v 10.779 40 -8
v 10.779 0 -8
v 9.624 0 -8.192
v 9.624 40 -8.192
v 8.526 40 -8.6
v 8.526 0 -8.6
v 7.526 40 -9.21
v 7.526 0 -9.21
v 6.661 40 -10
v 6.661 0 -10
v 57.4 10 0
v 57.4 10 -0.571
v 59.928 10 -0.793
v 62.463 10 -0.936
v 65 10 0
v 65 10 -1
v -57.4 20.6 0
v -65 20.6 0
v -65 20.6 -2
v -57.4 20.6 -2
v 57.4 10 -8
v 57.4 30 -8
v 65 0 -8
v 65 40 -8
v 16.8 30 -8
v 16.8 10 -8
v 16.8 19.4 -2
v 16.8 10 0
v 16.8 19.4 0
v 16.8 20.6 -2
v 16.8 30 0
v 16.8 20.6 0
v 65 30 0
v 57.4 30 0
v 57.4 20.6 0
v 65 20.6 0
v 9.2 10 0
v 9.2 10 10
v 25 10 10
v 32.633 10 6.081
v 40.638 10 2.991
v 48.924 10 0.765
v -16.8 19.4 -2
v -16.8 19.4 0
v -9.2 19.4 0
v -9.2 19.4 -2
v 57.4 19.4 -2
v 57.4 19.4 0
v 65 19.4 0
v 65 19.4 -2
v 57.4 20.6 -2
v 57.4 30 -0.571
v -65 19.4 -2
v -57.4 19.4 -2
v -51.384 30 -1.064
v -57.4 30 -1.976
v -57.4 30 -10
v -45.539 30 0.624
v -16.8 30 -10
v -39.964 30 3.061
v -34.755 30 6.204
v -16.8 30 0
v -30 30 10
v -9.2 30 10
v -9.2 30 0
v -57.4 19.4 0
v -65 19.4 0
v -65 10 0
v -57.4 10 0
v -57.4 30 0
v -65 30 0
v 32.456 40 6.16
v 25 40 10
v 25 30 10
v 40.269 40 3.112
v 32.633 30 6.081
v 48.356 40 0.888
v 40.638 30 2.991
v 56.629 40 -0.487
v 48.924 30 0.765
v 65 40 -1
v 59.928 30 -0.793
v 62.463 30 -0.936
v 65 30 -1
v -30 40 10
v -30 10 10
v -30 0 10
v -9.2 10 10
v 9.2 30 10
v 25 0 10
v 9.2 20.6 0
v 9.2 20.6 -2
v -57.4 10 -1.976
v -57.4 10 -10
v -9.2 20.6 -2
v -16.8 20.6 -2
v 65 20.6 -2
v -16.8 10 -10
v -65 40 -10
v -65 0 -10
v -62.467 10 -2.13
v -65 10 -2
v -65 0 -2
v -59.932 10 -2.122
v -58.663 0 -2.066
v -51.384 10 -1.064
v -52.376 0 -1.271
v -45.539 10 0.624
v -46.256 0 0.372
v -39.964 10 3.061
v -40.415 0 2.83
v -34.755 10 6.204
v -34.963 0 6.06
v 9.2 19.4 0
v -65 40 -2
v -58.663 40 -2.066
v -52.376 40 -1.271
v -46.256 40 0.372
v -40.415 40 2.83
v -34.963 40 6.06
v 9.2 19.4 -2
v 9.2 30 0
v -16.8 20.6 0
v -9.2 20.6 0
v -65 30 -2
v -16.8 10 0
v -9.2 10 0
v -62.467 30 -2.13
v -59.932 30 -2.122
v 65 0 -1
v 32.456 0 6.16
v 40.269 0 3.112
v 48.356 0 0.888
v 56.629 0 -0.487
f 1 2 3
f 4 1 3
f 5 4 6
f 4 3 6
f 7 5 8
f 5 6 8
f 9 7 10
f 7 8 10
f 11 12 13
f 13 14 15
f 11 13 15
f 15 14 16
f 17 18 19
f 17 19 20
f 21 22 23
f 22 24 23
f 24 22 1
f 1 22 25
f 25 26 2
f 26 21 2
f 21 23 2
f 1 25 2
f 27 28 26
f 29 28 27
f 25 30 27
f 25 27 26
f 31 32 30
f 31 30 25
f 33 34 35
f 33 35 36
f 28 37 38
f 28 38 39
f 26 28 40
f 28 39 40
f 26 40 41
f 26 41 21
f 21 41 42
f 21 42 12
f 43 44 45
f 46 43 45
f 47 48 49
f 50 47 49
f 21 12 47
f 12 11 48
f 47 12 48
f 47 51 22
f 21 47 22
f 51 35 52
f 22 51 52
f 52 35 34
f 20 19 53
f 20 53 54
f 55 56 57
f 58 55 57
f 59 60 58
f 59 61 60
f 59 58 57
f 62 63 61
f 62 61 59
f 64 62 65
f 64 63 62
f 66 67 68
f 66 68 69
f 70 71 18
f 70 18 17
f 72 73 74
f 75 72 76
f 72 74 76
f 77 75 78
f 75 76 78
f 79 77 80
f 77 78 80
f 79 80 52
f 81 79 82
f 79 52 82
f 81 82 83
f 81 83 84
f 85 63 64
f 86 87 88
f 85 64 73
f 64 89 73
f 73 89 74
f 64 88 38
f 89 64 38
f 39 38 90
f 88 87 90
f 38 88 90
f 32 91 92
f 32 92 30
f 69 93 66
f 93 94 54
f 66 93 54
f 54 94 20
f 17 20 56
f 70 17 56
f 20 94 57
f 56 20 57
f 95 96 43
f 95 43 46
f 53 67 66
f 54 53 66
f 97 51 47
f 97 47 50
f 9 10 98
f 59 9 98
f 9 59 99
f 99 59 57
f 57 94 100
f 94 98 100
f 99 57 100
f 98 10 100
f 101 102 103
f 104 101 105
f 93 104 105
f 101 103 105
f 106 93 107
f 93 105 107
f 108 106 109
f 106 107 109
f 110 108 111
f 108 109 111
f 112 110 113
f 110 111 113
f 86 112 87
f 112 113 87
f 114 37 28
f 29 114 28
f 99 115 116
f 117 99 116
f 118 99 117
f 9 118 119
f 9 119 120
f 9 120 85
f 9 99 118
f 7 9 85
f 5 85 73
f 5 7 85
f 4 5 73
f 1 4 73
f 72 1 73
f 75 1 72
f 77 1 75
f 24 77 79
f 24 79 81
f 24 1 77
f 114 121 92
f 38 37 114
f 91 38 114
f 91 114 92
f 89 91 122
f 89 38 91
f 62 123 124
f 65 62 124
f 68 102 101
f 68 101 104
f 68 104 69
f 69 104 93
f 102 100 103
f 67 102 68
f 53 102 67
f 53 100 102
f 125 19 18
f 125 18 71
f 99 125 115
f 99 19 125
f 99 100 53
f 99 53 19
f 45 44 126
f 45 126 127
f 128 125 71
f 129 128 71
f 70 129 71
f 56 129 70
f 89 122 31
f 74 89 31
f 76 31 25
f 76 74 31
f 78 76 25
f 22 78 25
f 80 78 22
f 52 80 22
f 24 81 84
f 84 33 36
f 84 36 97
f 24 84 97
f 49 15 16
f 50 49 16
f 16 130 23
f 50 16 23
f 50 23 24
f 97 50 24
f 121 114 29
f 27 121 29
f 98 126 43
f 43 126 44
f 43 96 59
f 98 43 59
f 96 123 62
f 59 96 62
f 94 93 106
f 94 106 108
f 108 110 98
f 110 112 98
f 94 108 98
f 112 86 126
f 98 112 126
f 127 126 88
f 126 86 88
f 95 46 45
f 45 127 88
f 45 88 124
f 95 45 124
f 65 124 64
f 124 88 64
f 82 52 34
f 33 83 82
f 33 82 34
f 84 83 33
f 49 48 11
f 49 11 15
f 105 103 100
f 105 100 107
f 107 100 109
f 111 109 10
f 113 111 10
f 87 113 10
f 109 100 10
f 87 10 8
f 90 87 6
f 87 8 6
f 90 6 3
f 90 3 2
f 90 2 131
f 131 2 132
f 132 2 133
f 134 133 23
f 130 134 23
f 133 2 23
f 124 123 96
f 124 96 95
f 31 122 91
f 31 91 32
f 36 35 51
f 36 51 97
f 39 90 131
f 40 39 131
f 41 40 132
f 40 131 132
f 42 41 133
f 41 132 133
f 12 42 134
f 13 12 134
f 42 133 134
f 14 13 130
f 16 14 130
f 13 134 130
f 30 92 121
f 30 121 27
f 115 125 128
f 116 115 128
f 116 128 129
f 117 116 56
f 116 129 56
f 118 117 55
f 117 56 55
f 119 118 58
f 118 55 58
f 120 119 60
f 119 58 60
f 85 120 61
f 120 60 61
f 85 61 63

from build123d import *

# Parameters (mm, degrees)
BOSS_EXTRUDE1_DEPTH = 40
SKETCH2_W           = 55.8
SKETCH2_H           = 20
CUT_EXTRUDE1_DEPTH  = 13.5
CUT_EXTRUDE2_REACH  = 79.506
SKETCH3_W           = 40.6
SKETCH3_H           = 20
SKETCH4_W           = 7.6
SKETCH4_H           = 20
BOSS_EXTRUDE2_DEPTH = 3.5
SKETCH5_W           = 55.8
SKETCH5_H           = 1.2
CUT_EXTRUDE3_DEPTH  = 2
SKETCH6_W           = 55.8
SKETCH6_H           = 1.2
CUT_EXTRUDE4_DEPTH  = 2


with BuildPart() as part:
    # Sketch1 → Boss-Extrude1 (new body)
    with BuildSketch(Plane(origin=(0, 0, 0), x_dir=(1, 0, 0), z_dir=(0, 1, 0))):
        with BuildLine():
            Line((65, 8), (23.977973373, 8))
            Line((23.977973373, 8), (10.779053292, 8))
            ThreePointArc((10.779053292, 8), (8.525859954, 8.600007042), (6.661212966, 10))
            Line((6.661212966, 10), (-20, 10))
            Line((-20, 10), (-65, 10))
            Line((-65, 10), (-65, 2))
            ThreePointArc((-65, 2), (-46.256011847, -0.371701222), (-30, -10))
            Line((-30, -10), (-20, -10))
            Line((-20, -10), (17.838709677, -10))
            Line((17.838709677, -10), (20, -10))
            Line((20, -10), (25, -10))
            ThreePointArc((25, -10), (44.283723708, -1.895358938), (65, 1))
            Line((65, 1), (65, 8))
        make_face()
    extrude(amount=BOSS_EXTRUDE1_DEPTH)

    # Sketch2 → Cut-Extrude1 (cut)
    with BuildSketch(Plane.XY.offset(10)):
        with Locations((37.1, 20)):
            Rectangle(SKETCH2_W, SKETCH2_H)
        with Locations((-37.1, 20)):
            Rectangle(SKETCH2_W, SKETCH2_H)
    extrude(amount=-CUT_EXTRUDE1_DEPTH, mode=Mode.SUBTRACT)

    # Sketch3 → Cut-Extrude2 (cut, up to next)
    with BuildSketch(Plane.XY.offset(-3.5), mode=Mode.PRIVATE) as cut_extrude2_sk1:
        with Locations((-37.1, 20)):
            Rectangle(SKETCH3_W, SKETCH3_H)
    cut_extrude2_tool1 = extrude(cut_extrude2_sk1.sketch, amount=-CUT_EXTRUDE2_REACH, mode=Mode.PRIVATE) & part.part
    # Sketch3 → Cut-Extrude2 (cut, up to next)
    with BuildSketch(Plane.XY.offset(-3.5), mode=Mode.PRIVATE) as cut_extrude2_sk2:
        with Locations((37.1, 20)):
            Rectangle(SKETCH3_W, SKETCH3_H)
    cut_extrude2_tool2 = extrude(cut_extrude2_sk2.sketch, amount=-CUT_EXTRUDE2_REACH, mode=Mode.PRIVATE) & part.part
    add(cut_extrude2_tool1.solids().sort_by_distance((-37.1, 20, -3.5))[0], mode=Mode.SUBTRACT)
    add(cut_extrude2_tool2.solids().sort_by_distance((37.1, 20, -3.5))[0], mode=Mode.SUBTRACT)

    # Sketch4 → Boss-Extrude2 (add)
    with BuildSketch(Plane.XY.offset(-3.5)):
        with Locations((-61.2, 20)):
            Rectangle(SKETCH4_W, SKETCH4_H)
        with Locations((-13, 20)):
            Rectangle(SKETCH4_W, SKETCH4_H)
        with Locations((13, 20)):
            Rectangle(SKETCH4_W, SKETCH4_H)
        with Locations((61.2, 20)):
            Rectangle(SKETCH4_W, SKETCH4_H)
    extrude(amount=BOSS_EXTRUDE2_DEPTH)

    # Sketch5 → Cut-Extrude3 (cut)
    with BuildSketch(Plane.XY):
        with Locations((-37.1, 20)):
            Rectangle(SKETCH5_W, SKETCH5_H)
    extrude(amount=-CUT_EXTRUDE3_DEPTH, mode=Mode.SUBTRACT)

    # Sketch6 → Cut-Extrude4 (cut)
    with BuildSketch(Plane.XY):
        with Locations((37.1, 20)):
            Rectangle(SKETCH6_W, SKETCH6_H)
    extrude(amount=-CUT_EXTRUDE4_DEPTH, mode=Mode.SUBTRACT)


solid = part.part
